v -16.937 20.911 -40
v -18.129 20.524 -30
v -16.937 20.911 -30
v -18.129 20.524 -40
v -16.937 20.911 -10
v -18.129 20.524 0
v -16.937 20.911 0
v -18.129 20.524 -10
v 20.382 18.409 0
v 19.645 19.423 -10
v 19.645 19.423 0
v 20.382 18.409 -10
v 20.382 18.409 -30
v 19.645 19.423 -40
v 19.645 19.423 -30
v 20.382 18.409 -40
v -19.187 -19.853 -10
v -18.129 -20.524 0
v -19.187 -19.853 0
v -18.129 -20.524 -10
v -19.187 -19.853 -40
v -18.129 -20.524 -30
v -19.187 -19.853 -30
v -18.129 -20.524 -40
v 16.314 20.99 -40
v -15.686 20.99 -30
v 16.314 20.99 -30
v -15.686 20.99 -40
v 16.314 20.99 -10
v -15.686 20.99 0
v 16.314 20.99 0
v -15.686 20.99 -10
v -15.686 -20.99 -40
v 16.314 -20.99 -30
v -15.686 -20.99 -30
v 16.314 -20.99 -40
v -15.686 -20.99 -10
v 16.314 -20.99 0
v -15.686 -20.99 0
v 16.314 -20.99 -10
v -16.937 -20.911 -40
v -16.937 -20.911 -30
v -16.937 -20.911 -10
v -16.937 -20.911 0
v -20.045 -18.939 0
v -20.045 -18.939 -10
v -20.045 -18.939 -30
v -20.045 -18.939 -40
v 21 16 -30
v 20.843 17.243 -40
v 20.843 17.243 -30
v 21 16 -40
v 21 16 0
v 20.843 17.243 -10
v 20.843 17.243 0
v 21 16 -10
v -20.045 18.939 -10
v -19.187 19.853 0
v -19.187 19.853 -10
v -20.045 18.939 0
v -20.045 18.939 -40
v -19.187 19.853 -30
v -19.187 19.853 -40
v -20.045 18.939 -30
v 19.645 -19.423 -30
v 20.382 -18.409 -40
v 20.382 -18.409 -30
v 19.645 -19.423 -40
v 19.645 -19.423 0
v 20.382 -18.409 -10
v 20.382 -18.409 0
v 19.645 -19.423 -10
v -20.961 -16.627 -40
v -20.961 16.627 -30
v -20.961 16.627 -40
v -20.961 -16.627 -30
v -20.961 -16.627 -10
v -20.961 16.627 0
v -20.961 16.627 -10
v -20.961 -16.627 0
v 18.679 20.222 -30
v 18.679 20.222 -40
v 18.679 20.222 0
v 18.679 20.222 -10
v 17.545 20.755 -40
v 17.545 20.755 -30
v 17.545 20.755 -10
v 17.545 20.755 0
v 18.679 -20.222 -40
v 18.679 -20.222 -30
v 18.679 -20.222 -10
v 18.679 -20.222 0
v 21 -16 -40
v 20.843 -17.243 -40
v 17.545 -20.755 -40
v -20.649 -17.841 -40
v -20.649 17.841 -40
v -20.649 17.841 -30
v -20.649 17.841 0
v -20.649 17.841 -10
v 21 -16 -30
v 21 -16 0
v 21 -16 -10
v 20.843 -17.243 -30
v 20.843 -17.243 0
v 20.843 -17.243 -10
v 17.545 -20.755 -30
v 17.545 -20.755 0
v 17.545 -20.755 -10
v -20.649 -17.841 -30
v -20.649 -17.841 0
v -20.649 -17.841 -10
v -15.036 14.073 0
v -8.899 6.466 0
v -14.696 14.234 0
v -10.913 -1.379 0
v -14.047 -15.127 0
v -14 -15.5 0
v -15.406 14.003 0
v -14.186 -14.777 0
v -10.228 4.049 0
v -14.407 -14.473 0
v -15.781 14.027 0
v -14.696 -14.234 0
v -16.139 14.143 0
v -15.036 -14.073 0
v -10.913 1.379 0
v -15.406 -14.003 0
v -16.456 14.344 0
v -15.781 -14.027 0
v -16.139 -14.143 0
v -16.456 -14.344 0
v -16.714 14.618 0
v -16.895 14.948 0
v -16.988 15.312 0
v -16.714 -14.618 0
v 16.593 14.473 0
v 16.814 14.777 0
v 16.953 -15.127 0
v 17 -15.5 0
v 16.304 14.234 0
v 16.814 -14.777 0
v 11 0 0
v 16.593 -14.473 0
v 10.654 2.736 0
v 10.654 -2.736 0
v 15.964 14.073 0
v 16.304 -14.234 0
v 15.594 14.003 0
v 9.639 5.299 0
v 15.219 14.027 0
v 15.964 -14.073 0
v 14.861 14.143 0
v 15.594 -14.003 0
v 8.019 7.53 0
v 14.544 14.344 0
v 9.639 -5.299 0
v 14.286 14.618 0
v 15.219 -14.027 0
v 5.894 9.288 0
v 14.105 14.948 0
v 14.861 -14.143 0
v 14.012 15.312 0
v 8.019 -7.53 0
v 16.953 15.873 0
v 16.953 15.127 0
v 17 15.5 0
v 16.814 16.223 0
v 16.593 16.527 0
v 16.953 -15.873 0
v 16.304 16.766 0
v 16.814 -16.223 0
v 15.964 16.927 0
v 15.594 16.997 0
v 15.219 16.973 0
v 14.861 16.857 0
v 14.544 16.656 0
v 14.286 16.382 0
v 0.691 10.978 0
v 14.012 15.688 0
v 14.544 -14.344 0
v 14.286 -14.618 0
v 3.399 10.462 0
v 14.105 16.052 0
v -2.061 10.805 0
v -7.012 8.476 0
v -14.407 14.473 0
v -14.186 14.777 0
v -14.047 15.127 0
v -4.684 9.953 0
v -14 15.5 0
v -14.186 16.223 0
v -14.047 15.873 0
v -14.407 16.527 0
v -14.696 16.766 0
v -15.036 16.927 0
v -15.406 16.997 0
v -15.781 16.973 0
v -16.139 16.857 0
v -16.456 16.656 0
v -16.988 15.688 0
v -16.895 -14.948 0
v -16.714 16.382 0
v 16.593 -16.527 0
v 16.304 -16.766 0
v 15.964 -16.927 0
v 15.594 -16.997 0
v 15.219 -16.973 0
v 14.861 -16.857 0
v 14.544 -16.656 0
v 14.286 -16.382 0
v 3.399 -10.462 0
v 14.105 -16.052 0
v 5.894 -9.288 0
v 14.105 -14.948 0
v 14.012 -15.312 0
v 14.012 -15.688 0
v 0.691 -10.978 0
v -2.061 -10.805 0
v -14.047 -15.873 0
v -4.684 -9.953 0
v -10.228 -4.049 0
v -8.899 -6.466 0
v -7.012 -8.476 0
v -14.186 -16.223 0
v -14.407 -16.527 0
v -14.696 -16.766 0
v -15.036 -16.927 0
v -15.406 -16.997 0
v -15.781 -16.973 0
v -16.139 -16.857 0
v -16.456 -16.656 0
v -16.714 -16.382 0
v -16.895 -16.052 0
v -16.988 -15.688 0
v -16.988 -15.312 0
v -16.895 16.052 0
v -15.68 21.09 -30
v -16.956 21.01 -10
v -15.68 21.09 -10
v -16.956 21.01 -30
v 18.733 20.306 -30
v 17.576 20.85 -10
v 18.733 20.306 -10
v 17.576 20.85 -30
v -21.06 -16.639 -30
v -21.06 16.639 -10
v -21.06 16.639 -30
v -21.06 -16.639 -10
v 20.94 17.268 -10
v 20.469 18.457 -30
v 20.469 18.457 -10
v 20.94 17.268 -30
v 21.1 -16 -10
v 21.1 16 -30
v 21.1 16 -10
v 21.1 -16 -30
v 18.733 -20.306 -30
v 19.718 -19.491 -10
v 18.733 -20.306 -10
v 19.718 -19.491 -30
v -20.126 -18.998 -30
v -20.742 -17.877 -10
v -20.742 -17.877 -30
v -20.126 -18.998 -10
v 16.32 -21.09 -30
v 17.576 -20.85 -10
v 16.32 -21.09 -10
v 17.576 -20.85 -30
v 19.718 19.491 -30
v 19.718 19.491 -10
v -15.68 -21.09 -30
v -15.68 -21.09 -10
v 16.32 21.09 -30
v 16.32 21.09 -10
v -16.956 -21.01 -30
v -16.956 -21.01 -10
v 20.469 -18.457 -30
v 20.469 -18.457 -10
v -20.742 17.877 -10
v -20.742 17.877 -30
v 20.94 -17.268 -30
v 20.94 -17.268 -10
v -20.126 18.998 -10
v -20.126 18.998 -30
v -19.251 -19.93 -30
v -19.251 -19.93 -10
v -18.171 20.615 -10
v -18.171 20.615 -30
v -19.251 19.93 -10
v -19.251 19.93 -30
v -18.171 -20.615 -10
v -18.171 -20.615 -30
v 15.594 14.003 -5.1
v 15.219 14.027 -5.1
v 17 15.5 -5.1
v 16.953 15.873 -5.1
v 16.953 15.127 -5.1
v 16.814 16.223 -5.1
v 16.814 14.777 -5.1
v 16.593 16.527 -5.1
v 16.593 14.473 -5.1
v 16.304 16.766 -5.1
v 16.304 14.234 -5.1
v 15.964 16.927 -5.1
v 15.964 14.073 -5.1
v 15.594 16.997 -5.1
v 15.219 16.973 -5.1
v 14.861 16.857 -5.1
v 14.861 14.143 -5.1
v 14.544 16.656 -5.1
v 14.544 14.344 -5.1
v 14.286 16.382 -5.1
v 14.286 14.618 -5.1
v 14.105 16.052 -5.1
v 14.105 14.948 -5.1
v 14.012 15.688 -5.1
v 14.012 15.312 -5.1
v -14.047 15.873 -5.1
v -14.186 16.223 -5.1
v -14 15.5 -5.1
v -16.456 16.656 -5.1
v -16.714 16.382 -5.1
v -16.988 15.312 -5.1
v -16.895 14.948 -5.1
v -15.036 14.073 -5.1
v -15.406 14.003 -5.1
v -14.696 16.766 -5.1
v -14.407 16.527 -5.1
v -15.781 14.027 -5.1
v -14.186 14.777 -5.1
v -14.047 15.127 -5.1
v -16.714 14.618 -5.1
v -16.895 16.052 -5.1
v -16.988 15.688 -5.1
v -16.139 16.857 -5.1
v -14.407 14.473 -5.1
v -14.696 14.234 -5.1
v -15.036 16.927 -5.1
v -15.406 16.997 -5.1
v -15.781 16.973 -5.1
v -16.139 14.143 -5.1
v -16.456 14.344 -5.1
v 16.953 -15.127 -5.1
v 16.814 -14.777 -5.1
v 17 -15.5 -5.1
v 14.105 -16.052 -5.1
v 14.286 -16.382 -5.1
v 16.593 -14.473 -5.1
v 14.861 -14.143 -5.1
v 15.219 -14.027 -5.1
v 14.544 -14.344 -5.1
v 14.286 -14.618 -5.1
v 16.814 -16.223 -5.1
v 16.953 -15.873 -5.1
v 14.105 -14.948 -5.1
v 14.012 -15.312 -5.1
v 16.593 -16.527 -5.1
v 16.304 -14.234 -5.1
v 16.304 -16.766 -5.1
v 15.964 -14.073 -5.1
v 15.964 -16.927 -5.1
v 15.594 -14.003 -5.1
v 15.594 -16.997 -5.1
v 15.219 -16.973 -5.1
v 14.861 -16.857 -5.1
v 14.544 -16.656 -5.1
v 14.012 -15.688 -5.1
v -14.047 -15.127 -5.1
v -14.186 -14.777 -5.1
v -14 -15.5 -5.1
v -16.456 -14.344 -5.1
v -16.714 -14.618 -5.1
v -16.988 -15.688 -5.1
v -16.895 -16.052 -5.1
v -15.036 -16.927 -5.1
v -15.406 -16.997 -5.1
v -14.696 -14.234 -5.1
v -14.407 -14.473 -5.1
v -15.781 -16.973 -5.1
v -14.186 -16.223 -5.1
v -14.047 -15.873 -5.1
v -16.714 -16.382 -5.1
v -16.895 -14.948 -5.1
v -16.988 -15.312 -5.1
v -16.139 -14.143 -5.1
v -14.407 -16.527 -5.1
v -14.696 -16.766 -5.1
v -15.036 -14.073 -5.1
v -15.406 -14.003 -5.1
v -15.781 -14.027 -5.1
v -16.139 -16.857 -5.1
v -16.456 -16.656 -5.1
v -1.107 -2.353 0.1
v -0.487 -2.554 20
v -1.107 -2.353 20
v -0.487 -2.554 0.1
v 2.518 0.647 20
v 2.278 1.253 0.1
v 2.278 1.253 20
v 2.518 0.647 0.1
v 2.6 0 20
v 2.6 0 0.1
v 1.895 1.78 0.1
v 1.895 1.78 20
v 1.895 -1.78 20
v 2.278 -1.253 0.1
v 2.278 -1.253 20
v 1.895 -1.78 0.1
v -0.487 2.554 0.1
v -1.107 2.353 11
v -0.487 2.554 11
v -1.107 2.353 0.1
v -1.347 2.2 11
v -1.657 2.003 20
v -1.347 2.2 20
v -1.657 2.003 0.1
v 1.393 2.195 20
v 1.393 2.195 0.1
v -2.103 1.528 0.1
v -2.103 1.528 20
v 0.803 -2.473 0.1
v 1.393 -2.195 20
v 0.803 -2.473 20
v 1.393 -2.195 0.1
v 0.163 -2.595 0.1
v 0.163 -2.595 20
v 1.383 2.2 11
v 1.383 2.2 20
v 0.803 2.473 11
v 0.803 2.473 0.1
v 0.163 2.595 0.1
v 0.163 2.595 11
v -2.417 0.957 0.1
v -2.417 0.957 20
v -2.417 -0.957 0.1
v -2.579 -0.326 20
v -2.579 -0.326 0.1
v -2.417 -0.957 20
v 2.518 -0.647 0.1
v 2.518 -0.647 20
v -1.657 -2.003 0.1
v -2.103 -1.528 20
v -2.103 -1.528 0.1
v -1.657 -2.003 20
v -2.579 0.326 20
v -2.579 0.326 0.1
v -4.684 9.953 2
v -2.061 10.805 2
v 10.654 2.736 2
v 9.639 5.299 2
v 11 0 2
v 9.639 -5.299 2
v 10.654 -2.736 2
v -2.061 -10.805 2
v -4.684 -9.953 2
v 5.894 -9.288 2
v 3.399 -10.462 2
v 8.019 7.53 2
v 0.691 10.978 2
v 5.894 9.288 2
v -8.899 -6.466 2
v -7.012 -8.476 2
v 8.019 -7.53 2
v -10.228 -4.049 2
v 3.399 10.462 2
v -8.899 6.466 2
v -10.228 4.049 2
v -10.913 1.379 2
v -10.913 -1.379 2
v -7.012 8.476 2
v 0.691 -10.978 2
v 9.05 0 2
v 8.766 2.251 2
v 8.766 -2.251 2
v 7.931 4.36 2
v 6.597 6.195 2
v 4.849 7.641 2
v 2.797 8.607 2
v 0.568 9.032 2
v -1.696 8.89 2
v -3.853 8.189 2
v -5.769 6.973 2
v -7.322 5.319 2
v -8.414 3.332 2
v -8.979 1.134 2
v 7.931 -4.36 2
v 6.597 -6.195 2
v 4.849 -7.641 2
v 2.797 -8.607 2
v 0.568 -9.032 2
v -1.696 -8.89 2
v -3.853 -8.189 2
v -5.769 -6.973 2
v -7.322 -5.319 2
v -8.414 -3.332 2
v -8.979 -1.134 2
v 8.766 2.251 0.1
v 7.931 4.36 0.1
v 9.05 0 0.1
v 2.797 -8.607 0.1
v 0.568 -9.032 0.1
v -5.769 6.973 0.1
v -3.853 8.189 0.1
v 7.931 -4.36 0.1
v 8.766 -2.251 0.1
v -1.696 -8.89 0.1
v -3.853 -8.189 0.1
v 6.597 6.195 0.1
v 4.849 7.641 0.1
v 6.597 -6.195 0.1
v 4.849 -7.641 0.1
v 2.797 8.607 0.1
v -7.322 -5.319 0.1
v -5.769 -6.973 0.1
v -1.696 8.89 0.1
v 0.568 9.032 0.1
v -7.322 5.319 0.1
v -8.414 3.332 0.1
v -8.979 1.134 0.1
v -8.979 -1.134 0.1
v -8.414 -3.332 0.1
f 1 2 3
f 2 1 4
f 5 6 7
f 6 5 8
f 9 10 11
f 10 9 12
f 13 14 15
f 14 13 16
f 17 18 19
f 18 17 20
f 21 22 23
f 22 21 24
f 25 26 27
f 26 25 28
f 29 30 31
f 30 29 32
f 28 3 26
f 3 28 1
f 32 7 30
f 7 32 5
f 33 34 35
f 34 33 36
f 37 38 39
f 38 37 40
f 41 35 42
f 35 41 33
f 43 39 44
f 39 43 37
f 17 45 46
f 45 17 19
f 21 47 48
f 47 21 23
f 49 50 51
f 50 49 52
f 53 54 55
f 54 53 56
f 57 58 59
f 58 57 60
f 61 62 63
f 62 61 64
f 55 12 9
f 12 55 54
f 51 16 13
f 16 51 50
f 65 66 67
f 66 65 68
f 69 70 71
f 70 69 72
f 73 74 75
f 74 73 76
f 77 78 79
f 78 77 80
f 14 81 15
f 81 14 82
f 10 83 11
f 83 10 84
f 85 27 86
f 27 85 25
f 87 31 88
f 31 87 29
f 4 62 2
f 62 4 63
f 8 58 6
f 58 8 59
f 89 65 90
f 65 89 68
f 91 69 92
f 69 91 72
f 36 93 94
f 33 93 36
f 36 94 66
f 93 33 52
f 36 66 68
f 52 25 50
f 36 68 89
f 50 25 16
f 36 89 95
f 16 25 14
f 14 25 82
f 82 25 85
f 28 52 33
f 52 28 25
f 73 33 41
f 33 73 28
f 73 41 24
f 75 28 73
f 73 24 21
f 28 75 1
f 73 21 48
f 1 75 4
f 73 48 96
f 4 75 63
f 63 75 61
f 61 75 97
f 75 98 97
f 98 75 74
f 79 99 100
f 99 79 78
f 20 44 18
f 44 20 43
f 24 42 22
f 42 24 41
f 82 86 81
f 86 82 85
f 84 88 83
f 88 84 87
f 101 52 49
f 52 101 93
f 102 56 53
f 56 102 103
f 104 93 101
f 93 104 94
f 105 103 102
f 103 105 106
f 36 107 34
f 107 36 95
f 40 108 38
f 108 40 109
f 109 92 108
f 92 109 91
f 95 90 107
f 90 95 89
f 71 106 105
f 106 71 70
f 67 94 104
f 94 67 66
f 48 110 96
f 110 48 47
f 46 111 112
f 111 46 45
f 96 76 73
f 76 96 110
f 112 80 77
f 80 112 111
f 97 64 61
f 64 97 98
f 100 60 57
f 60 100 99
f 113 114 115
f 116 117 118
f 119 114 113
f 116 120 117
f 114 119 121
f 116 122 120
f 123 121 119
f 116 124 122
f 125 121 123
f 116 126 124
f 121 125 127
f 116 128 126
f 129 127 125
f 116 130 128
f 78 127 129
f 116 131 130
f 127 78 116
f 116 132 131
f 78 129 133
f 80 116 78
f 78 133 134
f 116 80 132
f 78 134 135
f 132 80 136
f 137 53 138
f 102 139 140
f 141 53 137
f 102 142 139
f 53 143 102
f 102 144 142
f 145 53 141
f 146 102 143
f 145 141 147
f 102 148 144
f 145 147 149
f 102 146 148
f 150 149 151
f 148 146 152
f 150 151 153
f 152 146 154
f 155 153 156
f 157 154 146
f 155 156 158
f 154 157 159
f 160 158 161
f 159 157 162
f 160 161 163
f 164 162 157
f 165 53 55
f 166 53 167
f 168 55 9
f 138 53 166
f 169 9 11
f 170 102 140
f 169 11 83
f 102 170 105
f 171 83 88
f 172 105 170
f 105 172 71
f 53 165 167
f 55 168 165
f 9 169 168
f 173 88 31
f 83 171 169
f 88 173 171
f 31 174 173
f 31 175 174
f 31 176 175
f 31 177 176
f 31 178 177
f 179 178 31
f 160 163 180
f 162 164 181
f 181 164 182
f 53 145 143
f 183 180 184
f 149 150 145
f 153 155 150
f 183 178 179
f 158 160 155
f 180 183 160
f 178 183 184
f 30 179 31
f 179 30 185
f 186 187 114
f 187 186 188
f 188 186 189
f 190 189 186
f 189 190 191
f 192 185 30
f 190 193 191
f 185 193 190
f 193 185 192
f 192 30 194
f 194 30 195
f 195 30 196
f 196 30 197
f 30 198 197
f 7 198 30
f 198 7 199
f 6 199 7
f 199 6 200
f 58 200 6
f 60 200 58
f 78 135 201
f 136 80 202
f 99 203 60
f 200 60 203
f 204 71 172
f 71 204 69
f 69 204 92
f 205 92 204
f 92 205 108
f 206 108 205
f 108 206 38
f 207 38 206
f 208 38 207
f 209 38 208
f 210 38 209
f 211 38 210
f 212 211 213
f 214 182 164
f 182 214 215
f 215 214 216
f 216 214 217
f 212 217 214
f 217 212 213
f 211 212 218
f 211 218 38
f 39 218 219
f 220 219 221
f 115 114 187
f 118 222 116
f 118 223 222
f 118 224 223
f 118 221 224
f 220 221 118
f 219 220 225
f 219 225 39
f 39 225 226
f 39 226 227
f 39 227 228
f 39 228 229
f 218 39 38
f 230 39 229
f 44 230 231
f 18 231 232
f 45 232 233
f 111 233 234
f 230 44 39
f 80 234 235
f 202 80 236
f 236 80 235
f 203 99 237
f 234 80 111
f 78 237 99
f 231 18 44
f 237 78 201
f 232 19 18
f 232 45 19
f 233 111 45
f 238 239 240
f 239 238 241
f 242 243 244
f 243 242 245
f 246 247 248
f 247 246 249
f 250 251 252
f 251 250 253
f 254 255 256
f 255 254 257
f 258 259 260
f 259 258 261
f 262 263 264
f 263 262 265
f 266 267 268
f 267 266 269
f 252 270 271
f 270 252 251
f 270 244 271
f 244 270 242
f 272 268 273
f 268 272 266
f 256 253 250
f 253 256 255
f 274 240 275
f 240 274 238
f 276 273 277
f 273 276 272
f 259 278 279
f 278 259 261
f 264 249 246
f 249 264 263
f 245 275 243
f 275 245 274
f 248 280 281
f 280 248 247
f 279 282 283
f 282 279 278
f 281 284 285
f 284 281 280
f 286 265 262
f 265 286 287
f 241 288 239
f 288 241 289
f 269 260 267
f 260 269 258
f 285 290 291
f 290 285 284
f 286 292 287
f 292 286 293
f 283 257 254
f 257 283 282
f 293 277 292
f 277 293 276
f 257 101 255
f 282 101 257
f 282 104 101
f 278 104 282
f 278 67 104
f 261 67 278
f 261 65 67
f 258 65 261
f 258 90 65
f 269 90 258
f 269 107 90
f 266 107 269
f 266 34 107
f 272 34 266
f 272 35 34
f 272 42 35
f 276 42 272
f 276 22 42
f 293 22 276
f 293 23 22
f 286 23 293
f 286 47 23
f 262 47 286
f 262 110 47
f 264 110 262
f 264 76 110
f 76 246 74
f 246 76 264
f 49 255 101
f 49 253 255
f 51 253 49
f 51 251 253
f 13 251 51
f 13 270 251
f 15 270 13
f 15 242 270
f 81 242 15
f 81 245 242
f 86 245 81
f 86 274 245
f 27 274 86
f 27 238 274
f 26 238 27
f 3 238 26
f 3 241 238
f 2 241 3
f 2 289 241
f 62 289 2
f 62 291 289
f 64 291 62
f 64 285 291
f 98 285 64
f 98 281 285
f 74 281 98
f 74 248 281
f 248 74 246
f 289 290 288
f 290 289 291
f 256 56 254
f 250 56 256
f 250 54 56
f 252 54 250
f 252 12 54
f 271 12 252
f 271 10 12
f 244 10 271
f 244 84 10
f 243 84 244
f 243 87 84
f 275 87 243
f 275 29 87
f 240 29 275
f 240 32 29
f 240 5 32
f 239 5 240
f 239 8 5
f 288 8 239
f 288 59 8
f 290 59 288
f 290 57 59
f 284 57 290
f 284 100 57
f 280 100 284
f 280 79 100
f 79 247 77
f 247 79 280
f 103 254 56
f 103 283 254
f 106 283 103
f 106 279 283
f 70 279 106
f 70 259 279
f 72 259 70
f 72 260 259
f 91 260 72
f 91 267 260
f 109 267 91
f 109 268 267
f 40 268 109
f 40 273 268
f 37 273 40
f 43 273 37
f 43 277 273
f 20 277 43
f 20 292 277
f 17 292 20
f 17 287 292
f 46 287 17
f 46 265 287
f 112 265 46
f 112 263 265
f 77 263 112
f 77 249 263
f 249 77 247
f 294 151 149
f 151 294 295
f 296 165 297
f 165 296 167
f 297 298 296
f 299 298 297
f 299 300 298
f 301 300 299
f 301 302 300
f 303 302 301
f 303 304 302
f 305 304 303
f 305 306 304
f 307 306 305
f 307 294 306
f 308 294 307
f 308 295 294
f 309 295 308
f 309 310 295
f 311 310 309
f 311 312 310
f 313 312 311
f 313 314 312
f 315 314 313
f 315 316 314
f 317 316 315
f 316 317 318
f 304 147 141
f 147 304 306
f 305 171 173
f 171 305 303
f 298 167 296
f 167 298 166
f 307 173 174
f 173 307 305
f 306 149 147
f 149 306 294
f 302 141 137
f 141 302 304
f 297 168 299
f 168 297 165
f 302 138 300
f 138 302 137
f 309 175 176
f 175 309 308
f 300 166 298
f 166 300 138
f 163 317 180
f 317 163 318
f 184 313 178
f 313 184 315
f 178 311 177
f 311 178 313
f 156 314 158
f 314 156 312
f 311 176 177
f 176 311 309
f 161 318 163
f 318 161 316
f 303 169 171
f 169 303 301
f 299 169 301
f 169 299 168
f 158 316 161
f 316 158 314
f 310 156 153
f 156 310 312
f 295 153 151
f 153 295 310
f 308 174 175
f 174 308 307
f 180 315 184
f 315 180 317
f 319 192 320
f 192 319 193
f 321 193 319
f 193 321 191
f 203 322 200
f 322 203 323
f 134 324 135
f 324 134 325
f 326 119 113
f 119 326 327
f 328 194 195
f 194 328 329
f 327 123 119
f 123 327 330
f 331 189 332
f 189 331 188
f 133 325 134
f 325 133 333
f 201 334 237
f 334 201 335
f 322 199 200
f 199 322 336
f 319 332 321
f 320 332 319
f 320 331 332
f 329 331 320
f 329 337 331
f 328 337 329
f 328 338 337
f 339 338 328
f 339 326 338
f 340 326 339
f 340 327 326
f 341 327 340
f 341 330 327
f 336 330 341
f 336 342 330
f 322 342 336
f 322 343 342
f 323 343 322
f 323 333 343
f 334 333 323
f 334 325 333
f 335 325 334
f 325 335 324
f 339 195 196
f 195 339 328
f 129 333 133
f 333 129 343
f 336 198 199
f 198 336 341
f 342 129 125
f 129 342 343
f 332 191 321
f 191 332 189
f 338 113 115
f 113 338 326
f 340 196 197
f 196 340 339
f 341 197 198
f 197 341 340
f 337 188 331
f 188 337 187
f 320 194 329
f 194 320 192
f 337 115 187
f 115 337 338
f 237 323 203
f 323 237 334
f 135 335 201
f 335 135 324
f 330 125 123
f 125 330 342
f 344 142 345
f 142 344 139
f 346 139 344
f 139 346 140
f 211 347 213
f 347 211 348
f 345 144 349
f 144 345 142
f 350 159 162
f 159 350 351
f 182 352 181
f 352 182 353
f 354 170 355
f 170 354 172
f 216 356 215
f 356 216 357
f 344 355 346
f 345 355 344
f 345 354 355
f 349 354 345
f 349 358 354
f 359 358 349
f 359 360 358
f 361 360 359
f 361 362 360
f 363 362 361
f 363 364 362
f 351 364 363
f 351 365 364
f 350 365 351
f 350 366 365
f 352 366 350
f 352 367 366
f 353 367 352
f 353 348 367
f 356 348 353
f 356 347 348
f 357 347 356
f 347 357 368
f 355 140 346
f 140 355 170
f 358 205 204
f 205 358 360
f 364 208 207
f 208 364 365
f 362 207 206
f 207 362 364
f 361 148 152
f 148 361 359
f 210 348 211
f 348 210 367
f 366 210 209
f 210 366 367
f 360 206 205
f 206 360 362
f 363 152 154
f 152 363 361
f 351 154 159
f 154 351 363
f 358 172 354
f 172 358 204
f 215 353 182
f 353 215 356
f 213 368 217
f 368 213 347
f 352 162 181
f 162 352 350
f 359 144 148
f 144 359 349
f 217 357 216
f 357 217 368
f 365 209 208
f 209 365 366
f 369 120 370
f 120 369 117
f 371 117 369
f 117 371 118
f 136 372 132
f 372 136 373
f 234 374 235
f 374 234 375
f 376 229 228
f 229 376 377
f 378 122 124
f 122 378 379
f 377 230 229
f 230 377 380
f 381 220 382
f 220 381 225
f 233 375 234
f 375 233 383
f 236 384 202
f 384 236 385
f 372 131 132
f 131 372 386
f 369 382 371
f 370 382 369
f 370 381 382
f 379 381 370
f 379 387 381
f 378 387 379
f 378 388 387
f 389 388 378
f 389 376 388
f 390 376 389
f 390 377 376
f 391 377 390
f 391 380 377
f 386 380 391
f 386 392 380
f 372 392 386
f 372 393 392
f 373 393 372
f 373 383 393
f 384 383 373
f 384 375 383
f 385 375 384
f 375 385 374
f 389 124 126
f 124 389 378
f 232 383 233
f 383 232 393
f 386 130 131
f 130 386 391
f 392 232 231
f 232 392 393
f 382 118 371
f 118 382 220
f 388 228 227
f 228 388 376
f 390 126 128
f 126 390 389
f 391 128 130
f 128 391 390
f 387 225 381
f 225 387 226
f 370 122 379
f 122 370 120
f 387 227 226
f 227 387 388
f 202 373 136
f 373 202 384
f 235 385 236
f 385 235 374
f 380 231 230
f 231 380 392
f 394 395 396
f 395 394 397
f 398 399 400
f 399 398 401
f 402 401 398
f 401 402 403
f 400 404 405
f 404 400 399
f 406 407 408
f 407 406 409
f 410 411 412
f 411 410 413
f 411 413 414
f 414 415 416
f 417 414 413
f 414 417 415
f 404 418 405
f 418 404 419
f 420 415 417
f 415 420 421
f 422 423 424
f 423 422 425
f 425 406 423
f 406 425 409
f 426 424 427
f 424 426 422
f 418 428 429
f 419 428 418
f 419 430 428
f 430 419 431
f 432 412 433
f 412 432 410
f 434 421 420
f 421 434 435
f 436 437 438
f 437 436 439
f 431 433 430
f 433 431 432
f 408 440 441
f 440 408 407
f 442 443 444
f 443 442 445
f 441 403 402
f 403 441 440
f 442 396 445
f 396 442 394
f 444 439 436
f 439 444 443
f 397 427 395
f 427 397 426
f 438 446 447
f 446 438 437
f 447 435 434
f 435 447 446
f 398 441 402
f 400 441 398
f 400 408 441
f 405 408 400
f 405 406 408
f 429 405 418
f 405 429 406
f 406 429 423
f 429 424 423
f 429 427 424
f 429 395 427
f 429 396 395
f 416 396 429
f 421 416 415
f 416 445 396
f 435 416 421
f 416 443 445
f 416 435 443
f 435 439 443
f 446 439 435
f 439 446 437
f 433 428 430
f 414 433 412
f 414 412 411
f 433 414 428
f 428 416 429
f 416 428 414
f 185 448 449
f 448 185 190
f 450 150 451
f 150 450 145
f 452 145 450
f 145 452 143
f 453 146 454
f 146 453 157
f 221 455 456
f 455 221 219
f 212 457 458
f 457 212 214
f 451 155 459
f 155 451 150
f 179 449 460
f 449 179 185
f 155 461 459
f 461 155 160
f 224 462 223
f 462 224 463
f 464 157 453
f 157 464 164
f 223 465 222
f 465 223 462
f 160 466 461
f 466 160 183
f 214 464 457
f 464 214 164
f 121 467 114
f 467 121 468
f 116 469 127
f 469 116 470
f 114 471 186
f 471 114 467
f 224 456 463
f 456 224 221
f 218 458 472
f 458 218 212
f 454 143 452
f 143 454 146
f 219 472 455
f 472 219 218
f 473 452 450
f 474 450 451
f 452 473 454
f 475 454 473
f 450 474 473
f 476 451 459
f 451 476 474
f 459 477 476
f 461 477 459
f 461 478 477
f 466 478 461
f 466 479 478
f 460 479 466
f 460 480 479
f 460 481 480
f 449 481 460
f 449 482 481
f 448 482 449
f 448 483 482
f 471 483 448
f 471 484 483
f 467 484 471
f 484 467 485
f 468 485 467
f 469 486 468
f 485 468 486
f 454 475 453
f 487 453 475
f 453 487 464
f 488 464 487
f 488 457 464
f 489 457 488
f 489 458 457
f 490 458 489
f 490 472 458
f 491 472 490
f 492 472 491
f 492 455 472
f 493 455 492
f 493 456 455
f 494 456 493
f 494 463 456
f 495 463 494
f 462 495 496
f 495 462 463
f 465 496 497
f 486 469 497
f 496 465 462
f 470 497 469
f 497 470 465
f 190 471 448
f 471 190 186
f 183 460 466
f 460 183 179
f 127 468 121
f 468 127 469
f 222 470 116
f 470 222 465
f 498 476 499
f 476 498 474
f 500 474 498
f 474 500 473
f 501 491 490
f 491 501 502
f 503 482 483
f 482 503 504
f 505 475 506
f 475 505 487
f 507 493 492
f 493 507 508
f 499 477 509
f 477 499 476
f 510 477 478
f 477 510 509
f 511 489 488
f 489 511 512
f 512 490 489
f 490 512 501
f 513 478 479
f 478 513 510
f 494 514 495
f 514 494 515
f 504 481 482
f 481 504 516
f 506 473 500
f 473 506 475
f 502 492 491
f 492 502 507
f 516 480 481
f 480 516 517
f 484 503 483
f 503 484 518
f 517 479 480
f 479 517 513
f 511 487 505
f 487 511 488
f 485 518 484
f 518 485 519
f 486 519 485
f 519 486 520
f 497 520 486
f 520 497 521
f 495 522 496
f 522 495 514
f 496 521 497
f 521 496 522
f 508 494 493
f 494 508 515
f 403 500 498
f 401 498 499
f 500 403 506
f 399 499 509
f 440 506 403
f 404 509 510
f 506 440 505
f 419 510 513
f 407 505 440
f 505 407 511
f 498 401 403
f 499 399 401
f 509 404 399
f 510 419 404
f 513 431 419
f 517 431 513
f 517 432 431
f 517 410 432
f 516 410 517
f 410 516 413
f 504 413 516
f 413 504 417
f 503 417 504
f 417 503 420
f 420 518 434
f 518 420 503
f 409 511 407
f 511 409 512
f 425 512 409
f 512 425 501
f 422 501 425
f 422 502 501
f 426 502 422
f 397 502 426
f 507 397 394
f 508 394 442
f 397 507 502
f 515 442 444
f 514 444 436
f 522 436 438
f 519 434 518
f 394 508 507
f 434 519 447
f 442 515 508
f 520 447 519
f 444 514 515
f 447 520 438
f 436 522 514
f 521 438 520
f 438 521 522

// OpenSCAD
$fn=25;

module nema_17(motor_height = 40, shaft_diameter = 5.2, shaft_flat = 0.2)
{
    rotate(a=90, v=[-1,0,0])
    nema(motor_size = 42, motor_height = 40, shaft_diameter = 5.2, shaft_flat = 0.2);
}

nema_17();

module nema(motor_size=42, motor_height = 38, shaft_diameter = 5.2, shaft_flat = 0.2) {
	difference() {

    union()
    {
        color("silver")
        // Motor base
		translate([0,motor_height/2,0]) rotate([90,0,0]) hull() {
			translate([-(motor_size/2-5),(motor_size/2-5),0]) cylinder(r=5,h=motor_height, center = true);
			translate([(motor_size/2-5),(motor_size/2-5),0]) cylinder(r=5,h=motor_height, center = true);
			translate([-(motor_size/2-5),-(motor_size/2-5),0]) cylinder(r=5,h=motor_height, center = true);
			translate([(motor_size/2-5),-(motor_size/2-5),0]) cylinder(r=5,h=motor_height, center = true);
		}
        color("black")
        translate([0,motor_height/2,0]) rotate([90,0,0]) hull() {
            translate([-(motor_size/2-5),(motor_size/2-5),0]) cylinder(r=5.1,h=motor_height/2, center = true);
            translate([(motor_size/2-5),(motor_size/2-5),0]) cylinder(r=5.1,h=motor_height/2, center = true);
            translate([-(motor_size/2-5),-(motor_size/2-5),0]) cylinder(r=5.1,h=motor_height/2, center = true);
            translate([(motor_size/2-5),-(motor_size/2-5),0]) cylinder(r=5.1,h=motor_height/2, center = true);
        }
    }


        // Mount holes
        union() {
		translate([15.5,0.1,15.5]) rotate([90,0,0]) cylinder(r=1.5,h=10, center = true);
		translate([-15.5,0.1,15.5]) rotate([90,0,0]) cylinder(r=1.5,h=10, center = true);
		translate([15.5,0.1,-15.5]) rotate([90,0,0]) cylinder(r=1.5,h=10, center = true);
		translate([-15.5,0.1,-15.5]) rotate([90,0,0]) cylinder(r=1.5,h=10, center = true);
        }
	}
    color("silver")
    // Motor shaft
	translate([0,-10,0]) rotate([90,0,0])
    difference() {    
        cylinder(r=shaft_diameter/2,h=20, center = true); 
        translate([-shaft_diameter/2,(shaft_diameter/2)-shaft_flat*2,1])
        cube([shaft_diameter,shaft_diameter/2,10]);
    }
    color("gray")
    // The ring around the motor shaft
	difference() {
		translate([0,-1,0]) rotate([90,0,0]) cylinder(r=11,h=2, center = true);
		translate([0,-1.1,0]) rotate([90,0,0]) cylinder(r=9.05,h=2, center = true);
	}
}

module nema_holes(places=[1,1,1,1], size=15.5, h=10, holes=false, shadow=false, $fn=8){
    for (i=[0:3]) {
        if (places[i] == 1) {
            rotate([0, 0, 90*i]) translate([size, size, 0]) {
                if (holes) {
                    rotate([0, 0, -90*i]) translate([0,0,0]) rotate([0,0,90]) cylinder_poly(h = h+0.1, r = M3/2);
					rotate([0, 0, -90*i]) translate([0,0,h]) rotate([0,0,22.5]) cylinder(h = h, r = M3*2.2/2, $fn = $fn);
                } else {
                    rotate([0, 0, -90*i]) cylinder(h=h, r=4, $fn=$fn);
                }
            }
        }
    }
    if (shadow != false) {
        %translate ([0, 0, -19]) cube([42,42,38], center = true);
    //flange
        translate ([0, 0, 0]) cylinder(r=22.6/2,h=h*2, center = false, $fn=20);
    //shaft
        %translate ([0, 0, 0]) cylinder(r=2.5,h=14, center = false);
    }
}
